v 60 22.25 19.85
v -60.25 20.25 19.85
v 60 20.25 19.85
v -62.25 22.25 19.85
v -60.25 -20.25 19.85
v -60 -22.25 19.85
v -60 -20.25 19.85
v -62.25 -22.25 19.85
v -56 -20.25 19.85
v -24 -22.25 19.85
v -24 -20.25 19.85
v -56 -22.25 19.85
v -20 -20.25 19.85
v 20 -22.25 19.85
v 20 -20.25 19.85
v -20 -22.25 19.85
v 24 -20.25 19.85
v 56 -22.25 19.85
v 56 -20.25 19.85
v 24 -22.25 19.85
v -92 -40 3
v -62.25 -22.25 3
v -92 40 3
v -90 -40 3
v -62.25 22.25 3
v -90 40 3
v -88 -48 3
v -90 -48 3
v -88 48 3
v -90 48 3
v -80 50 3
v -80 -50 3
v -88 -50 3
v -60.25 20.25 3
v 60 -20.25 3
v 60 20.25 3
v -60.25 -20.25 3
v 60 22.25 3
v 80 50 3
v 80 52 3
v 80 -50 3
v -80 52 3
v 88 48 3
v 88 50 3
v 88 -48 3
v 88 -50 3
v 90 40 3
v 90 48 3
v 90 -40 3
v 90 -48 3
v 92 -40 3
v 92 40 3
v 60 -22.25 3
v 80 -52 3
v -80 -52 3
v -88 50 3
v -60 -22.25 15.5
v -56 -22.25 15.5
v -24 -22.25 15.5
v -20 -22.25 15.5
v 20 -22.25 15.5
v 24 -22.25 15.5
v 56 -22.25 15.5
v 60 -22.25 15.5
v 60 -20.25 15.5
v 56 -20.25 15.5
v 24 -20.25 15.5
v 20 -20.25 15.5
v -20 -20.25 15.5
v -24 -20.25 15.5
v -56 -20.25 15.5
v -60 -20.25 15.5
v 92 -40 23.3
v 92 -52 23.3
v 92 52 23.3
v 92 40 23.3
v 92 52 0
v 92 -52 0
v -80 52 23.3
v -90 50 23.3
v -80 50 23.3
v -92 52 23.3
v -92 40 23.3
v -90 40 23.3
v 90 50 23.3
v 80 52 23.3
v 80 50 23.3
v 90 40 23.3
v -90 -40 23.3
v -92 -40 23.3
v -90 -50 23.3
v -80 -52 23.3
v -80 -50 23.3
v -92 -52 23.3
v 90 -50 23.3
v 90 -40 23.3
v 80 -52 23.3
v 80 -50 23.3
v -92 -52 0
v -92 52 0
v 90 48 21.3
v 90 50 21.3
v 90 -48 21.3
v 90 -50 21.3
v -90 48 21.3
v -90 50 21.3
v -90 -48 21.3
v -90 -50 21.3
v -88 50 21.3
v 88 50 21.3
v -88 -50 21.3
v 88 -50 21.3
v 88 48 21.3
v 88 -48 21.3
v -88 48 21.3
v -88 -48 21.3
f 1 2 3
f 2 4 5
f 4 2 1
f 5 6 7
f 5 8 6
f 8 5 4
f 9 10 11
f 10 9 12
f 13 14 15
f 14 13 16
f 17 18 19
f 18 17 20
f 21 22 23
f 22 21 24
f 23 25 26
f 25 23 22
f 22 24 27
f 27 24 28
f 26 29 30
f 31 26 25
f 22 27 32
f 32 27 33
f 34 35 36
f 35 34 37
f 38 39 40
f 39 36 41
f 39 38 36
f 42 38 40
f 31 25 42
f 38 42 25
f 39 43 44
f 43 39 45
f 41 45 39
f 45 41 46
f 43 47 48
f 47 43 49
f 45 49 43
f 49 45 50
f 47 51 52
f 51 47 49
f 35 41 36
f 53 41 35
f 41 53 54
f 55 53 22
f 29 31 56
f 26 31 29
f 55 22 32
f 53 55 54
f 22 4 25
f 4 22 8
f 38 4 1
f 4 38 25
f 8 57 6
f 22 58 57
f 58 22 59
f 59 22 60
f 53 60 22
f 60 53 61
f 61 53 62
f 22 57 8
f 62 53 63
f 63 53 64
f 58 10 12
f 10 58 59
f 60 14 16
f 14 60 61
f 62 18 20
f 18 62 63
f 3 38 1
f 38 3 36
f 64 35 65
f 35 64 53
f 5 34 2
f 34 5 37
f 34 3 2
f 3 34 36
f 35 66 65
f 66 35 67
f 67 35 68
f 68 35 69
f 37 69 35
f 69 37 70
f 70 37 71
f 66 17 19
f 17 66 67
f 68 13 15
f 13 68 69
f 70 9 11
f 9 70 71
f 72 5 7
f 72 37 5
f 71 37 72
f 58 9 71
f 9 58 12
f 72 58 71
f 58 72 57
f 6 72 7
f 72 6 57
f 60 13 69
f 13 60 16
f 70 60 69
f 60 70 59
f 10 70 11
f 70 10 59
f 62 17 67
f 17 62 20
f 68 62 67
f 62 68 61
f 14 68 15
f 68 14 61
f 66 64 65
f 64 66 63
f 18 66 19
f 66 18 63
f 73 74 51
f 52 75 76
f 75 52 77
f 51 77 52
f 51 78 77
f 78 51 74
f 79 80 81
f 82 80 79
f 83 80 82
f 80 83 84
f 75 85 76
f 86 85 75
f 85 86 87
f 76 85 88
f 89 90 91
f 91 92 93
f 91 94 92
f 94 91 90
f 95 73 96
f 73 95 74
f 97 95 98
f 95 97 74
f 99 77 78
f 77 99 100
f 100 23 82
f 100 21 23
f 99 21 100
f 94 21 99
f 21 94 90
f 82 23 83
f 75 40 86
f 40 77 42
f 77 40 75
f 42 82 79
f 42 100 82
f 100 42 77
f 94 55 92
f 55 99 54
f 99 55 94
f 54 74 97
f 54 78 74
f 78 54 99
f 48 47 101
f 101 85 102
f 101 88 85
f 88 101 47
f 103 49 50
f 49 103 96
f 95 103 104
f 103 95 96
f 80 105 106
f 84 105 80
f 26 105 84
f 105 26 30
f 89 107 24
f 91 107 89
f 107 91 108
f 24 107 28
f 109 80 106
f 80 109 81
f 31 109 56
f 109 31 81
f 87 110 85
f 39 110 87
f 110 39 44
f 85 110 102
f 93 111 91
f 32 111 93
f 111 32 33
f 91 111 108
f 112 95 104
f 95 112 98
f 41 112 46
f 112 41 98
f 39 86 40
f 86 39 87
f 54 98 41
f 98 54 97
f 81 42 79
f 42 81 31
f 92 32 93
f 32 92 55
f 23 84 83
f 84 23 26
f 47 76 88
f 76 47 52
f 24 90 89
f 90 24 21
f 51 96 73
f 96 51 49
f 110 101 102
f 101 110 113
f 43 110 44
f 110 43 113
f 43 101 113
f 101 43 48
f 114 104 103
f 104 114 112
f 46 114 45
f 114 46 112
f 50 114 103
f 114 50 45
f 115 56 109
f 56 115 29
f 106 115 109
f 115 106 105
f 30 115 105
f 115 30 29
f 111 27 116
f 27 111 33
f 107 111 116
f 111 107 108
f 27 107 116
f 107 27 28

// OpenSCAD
// file: ../parameters.scad
//============================================//
//                CLOUD CHAMBER               //
//============================================//

observation_surface_x = 180;
observation_surface_y = 100;

//peltiers
peltier_size_x = 40;
peltier_size_y = 40;
peltier_thickness = 2.9;
peltier_cable_diameter = 4;

//water ALU block
water_block_width = 40;
water_block_length = 120;
water_block_thickness = 12.5;

//hose
hose_outer_diameter = 10;
hose_inner_diameter = 8;


//========== ALU PROFILES ==========//

//L_profile 2015
L_2015_width = 20;
L_2015_height = 15;
L_2015_thickness = 2;

//T_profile 2020
T_2020_width = 20;
T_2020_height = 20;
T_2020_thickness = 2;


//========== SCREWS ==========//

//Screw diameter and nut for M10 [mm]
M10_screw_diameter=10.4;
M10_head_height = 10;
M10_head_diameter = 16+0.5;
M10_nut_height = 10.5;
M10_nut_diameter = 25.5;
M10_nut_pocket = 22.3;

//Screw diameter and nut for M8 [mm]
M8_screw_diameter = 8 + 1;
M8_head_height = 8;
M8_head_diameter = 13.5;
M8_nut_height = 7.5;
M8_nut_diameter = 14.4 + 0.5;
M8_nut_pocket = 13 + 0.5;

//Screw diameter and nut for M6 [mm]
M6_screw_diameter=6.5;
M6_head_diameter = 10+0.5;
M6_head_height = 6;
M6_nut_height = 4.9;
M6_nut_diameter = 11.8;
M6_nut_pocket = 10.4;

//Screw diameter and nut for M5 [mm]
M5_screw_diameter=5.5;
M5_head_height = 5;
M5_head_diameter = 13+0.5;
M5_nut_height = 4.5;
M5_nut_diameter = 9.4;
M5_nut_pocket = 8.4;

//Screw diameter and nut for M4 [mm]
M4_screw_diameter=4.5;
M4_screw_head_height = 4;
M4_nut_height = 3.2;
M4_nut_diameter = 8.4;
M4_nut_pocket = 7.5;

//Screw diameter and nut for M3 [mm]
M3_screw_diameter = 3.2;
M3_nut_height = 2.7;
M3_nut_diameter = 6.6;
M3_screw_head_height = 3;
M3_nut_pocket = 5.6;

//Screw diameter and nut for M2,5 [mm]
M2_5_screw_diameter = 2.7;
M2_5_nut_height = 2.3;
M2_5_nut_diameter = 6;
M2_5_nut_pocket = 5.1;
// main file
include <../parameters.scad>

bottom_thickness = 3;
border_thickness = 2;
border_height = water_block_thickness+peltier_thickness*2+2;
border_corner_size = 10;
copper_plate_support = 2;
water_block_tolerance = 0.5;

module 1001_AB(peltiers=false) {
    if(peltiers==true) {
        translate([0, 0, bottom_thickness+water_block_thickness/2])
            #cube([water_block_length, water_block_width, water_block_thickness], center=true);

        translate([-water_block_length/2+peltier_size_x/2, 0, bottom_thickness+water_block_thickness+peltier_thickness])
            #cube([peltier_size_x, peltier_size_y, peltier_thickness*2], center=true);

        translate([water_block_length/2-peltier_size_x/2, 0, bottom_thickness+water_block_thickness+peltier_thickness])
            #cube([peltier_size_x, peltier_size_y, peltier_thickness*2], center=true);
    }

    translate([observation_surface_x/2-copper_plate_support, observation_surface_y/2-copper_plate_support, bottom_thickness])
        cube([copper_plate_support, copper_plate_support, water_block_thickness+peltier_thickness*2]);

    translate([observation_surface_x/2-copper_plate_support, -observation_surface_y/2, bottom_thickness])
        cube([copper_plate_support, copper_plate_support, water_block_thickness+peltier_thickness*2]);

    translate([-observation_surface_x/2, observation_surface_y/2-copper_plate_support, bottom_thickness])
        cube([copper_plate_support, copper_plate_support, water_block_thickness+peltier_thickness*2]);

    translate([-observation_surface_x/2, -observation_surface_y/2, bottom_thickness])
        cube([copper_plate_support, copper_plate_support, water_block_thickness+peltier_thickness*2]);

    difference() {
        translate([0, 0, bottom_thickness+(water_block_thickness+peltier_thickness*1.5)/2]) {
            cube([water_block_length+border_thickness*2+water_block_tolerance, water_block_width+border_thickness*2+water_block_tolerance, water_block_thickness+peltier_thickness*1.5], center=true);
        }
        translate([water_block_length/2, -water_block_width, 0])
            cube([100, water_block_width*2, 100]);

        translate([0, 0 ,bottom_thickness+50])
            cube([water_block_length+water_block_tolerance, water_block_width+water_block_tolerance, 100], center=true);

        translate([-water_block_length/2, -water_block_width/2-water_block_tolerance/2-border_thickness-0.1, bottom_thickness+water_block_thickness])
            cube([peltier_cable_diameter, border_thickness*2, 20]);

        translate([-water_block_length/2+peltier_size_x-peltier_cable_diameter, -water_block_width/2-water_block_tolerance/2-border_thickness-0.1, bottom_thickness+water_block_thickness])
            cube([peltier_cable_diameter, border_thickness*2, 20]);

        translate([water_block_length/2-peltier_size_x, -water_block_width/2-water_block_tolerance/2-border_thickness-0.1, bottom_thickness+water_block_thickness])
            cube([peltier_cable_diameter, border_thickness*2, 20]);

        translate([water_block_length/2-peltier_cable_diameter, -water_block_width/2-water_block_tolerance/2-border_thickness-0.1, bottom_thickness+water_block_thickness])
            cube([peltier_cable_diameter, border_thickness*2, 20]);
    }

    difference() {
        union() {
            translate([0, 0, (bottom_thickness+border_height)/2])
                cube([observation_surface_x+border_thickness*2, observation_surface_y+border_thickness*2, bottom_thickness+border_height], center=true);

            
        }

        translate([0, 0, bottom_thickness+50])
            cube([observation_surface_x, observation_surface_y, 100], center=true);

        translate([0, 0, bottom_thickness+50])
            cube([observation_surface_x-border_corner_size*2, observation_surface_y*2, 100], center=true);

        translate([0, 0, bottom_thickness+50])
            cube([observation_surface_x*2, observation_surface_y-border_corner_size*2, 100], center=true);
    }
}

1001_AB();
